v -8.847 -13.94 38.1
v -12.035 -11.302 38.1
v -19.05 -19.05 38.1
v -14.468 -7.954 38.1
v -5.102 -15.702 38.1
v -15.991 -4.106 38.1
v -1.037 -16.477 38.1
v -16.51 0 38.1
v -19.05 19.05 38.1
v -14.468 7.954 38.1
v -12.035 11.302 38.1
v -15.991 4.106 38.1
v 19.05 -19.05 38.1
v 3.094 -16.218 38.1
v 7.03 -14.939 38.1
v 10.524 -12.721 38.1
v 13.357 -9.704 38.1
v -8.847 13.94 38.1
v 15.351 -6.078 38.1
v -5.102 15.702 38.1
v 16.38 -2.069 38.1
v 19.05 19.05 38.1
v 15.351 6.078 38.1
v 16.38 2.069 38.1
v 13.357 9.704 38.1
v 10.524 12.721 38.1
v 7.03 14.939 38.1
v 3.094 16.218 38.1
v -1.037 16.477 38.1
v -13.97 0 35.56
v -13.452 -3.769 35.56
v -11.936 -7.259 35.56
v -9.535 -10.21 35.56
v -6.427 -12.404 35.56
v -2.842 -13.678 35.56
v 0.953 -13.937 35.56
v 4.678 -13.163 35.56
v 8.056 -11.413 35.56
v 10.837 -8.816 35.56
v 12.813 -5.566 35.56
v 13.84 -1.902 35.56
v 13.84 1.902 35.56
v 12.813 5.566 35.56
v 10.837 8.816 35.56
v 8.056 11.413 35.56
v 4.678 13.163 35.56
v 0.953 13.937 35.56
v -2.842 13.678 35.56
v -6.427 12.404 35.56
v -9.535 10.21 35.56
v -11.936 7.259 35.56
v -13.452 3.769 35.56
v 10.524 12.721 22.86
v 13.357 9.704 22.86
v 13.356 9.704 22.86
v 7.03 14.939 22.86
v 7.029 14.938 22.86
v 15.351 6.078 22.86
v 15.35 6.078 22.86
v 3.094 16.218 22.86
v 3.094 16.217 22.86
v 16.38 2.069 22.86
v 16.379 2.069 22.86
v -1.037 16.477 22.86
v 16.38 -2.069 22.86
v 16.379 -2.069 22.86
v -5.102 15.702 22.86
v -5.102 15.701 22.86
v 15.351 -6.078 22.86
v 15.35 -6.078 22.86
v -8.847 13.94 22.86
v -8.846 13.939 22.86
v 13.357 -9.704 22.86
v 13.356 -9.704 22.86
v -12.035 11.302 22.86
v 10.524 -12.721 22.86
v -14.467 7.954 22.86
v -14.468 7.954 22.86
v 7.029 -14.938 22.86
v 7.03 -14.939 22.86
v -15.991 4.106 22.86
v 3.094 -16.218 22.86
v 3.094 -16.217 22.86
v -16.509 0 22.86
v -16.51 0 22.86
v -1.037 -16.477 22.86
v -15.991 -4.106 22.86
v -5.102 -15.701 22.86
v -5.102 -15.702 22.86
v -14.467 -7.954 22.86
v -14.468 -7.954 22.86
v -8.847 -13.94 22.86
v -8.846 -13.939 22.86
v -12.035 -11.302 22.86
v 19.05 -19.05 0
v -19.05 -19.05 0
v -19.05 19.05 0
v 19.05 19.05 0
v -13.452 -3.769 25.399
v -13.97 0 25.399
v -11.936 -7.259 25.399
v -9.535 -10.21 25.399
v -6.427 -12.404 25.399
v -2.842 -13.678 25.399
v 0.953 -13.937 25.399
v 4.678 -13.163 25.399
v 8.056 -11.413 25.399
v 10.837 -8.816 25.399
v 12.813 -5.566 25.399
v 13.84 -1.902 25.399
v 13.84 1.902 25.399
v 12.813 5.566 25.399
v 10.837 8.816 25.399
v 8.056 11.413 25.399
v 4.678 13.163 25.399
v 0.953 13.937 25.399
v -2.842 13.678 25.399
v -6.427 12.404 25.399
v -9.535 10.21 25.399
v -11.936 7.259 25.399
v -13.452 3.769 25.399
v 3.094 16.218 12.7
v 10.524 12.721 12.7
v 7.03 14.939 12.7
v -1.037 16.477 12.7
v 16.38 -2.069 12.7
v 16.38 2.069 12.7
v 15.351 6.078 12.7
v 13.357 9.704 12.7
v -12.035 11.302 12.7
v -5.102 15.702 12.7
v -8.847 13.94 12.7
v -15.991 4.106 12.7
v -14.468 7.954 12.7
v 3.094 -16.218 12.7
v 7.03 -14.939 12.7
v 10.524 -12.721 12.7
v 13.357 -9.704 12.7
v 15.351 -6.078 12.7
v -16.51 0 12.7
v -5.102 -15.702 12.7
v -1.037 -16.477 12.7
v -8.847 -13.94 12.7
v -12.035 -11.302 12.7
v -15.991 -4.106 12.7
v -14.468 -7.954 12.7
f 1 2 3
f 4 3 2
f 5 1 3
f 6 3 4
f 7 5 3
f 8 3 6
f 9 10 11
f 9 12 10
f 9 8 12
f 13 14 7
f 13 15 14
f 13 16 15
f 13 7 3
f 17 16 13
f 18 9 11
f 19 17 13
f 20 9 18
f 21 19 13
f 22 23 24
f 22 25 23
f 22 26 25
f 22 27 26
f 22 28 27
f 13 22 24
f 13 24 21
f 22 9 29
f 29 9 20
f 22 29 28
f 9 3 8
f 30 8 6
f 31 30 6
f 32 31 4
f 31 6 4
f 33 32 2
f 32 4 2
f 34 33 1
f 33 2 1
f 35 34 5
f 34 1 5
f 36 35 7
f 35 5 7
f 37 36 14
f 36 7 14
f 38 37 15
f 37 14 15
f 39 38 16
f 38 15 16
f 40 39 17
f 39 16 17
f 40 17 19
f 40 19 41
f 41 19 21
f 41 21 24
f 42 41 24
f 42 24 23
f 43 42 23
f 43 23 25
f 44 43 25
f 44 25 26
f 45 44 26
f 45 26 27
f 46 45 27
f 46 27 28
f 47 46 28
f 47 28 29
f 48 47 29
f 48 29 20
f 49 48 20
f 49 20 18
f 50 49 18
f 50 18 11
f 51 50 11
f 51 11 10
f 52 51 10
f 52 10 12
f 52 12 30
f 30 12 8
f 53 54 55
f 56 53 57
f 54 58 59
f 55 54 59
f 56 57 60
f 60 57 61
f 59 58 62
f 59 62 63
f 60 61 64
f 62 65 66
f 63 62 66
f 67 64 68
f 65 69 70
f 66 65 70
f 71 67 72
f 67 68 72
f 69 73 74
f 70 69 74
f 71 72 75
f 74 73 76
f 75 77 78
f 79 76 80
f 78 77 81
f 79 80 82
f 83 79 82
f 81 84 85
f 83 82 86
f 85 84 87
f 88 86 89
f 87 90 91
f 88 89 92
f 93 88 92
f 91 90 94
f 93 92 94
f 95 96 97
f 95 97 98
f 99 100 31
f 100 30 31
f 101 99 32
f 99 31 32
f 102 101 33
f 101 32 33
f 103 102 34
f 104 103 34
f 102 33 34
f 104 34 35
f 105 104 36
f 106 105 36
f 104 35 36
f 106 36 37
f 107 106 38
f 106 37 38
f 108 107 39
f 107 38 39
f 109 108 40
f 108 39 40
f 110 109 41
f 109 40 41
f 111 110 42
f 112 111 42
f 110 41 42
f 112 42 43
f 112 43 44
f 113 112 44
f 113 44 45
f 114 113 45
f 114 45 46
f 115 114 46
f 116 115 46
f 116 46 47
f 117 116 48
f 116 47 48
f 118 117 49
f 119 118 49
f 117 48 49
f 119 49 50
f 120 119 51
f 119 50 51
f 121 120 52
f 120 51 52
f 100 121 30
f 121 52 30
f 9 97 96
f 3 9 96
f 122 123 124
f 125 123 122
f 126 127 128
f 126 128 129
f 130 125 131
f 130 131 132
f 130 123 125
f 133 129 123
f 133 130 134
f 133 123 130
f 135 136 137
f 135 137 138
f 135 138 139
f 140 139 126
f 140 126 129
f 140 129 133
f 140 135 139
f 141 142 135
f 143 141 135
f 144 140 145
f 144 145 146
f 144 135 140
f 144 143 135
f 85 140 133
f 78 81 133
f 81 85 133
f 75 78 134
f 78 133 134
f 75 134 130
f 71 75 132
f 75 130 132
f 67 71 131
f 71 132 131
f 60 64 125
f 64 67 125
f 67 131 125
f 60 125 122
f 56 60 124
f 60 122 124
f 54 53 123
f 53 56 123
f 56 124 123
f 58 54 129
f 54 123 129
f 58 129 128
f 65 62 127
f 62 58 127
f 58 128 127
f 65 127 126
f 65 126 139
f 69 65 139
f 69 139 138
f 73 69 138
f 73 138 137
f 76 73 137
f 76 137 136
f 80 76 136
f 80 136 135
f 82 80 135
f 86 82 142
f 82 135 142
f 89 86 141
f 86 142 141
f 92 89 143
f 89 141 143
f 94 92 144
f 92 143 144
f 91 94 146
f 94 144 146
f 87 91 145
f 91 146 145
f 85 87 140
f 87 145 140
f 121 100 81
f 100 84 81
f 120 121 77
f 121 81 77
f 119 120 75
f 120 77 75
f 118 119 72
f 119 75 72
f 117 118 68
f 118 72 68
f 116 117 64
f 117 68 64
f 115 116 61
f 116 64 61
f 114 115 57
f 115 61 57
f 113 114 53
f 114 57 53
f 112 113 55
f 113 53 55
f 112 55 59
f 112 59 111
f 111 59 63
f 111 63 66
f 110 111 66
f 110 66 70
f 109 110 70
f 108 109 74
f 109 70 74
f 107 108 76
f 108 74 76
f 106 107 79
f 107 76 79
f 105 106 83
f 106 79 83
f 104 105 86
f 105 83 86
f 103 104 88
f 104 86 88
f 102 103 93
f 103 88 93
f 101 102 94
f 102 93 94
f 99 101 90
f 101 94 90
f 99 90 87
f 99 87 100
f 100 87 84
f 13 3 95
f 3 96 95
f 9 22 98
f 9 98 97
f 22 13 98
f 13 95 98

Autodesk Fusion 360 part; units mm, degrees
sketch "Sketch1" plane through (0, 0, 0) normal (0, 0, 1) x (1, 0, 0)
  line L0 (-19.05, -19.05) -> (19.05, -19.05)
  line L1 (19.05, -19.05) -> (19.05, 19.05)
  line L2 (19.05, 19.05) -> (-19.05, 19.05)
  line L3 (-19.05, 19.05) -> (-19.05, -19.05)
  line L4 (0, 1.75) -> (0, 22.5)
  line L5 (1.75, 0) -> (22.5, 0)
  dimension "d1" = 38.1
  dimension "d2" = 38.1
extrude "Extrude1" add sketch "Sketch1" along normal blind 38.1
sketch "Sketch2" plane through (0, 0, 38.1) normal (0, 0, 1) x (-1, 0, 0)
  line L0 (19.05, -19.05) -> (19.05, 19.05)
  line L1 (19.05, 19.05) -> (-19.05, 19.05)
  line L2 (-19.05, 19.05) -> (-19.05, -19.05)
  line L3 (-19.05, -19.05) -> (19.05, -19.05)
  circle A0 centre (0, 0) radius 13.97
  dimension "d5" = 27.94
extrude "Extrude2" cut sketch "Sketch2" against normal blind 25.4 contours A0
sketch "Sketch3" plane through (0, 0, 12.7) normal (0, 0, 1) x (-1, 0, 0)
  circle A0 centre (0, 0) radius 13.97
  circle A1 centre (0, 0) radius 16.51
  dimension "d8" = 2.54
extrude "Extrude3" cut sketch "Sketch3" along normal blind 10.16 contours A0 | A1
chamfer "Chamfer1" distance 2.54 angle 45 1 edges at (13.0246, -5.0518, 22.86)
chamfer "Chamfer2" distance 2.54 angle 45 1 edges at (13.0246, -5.0518, 38.1)
